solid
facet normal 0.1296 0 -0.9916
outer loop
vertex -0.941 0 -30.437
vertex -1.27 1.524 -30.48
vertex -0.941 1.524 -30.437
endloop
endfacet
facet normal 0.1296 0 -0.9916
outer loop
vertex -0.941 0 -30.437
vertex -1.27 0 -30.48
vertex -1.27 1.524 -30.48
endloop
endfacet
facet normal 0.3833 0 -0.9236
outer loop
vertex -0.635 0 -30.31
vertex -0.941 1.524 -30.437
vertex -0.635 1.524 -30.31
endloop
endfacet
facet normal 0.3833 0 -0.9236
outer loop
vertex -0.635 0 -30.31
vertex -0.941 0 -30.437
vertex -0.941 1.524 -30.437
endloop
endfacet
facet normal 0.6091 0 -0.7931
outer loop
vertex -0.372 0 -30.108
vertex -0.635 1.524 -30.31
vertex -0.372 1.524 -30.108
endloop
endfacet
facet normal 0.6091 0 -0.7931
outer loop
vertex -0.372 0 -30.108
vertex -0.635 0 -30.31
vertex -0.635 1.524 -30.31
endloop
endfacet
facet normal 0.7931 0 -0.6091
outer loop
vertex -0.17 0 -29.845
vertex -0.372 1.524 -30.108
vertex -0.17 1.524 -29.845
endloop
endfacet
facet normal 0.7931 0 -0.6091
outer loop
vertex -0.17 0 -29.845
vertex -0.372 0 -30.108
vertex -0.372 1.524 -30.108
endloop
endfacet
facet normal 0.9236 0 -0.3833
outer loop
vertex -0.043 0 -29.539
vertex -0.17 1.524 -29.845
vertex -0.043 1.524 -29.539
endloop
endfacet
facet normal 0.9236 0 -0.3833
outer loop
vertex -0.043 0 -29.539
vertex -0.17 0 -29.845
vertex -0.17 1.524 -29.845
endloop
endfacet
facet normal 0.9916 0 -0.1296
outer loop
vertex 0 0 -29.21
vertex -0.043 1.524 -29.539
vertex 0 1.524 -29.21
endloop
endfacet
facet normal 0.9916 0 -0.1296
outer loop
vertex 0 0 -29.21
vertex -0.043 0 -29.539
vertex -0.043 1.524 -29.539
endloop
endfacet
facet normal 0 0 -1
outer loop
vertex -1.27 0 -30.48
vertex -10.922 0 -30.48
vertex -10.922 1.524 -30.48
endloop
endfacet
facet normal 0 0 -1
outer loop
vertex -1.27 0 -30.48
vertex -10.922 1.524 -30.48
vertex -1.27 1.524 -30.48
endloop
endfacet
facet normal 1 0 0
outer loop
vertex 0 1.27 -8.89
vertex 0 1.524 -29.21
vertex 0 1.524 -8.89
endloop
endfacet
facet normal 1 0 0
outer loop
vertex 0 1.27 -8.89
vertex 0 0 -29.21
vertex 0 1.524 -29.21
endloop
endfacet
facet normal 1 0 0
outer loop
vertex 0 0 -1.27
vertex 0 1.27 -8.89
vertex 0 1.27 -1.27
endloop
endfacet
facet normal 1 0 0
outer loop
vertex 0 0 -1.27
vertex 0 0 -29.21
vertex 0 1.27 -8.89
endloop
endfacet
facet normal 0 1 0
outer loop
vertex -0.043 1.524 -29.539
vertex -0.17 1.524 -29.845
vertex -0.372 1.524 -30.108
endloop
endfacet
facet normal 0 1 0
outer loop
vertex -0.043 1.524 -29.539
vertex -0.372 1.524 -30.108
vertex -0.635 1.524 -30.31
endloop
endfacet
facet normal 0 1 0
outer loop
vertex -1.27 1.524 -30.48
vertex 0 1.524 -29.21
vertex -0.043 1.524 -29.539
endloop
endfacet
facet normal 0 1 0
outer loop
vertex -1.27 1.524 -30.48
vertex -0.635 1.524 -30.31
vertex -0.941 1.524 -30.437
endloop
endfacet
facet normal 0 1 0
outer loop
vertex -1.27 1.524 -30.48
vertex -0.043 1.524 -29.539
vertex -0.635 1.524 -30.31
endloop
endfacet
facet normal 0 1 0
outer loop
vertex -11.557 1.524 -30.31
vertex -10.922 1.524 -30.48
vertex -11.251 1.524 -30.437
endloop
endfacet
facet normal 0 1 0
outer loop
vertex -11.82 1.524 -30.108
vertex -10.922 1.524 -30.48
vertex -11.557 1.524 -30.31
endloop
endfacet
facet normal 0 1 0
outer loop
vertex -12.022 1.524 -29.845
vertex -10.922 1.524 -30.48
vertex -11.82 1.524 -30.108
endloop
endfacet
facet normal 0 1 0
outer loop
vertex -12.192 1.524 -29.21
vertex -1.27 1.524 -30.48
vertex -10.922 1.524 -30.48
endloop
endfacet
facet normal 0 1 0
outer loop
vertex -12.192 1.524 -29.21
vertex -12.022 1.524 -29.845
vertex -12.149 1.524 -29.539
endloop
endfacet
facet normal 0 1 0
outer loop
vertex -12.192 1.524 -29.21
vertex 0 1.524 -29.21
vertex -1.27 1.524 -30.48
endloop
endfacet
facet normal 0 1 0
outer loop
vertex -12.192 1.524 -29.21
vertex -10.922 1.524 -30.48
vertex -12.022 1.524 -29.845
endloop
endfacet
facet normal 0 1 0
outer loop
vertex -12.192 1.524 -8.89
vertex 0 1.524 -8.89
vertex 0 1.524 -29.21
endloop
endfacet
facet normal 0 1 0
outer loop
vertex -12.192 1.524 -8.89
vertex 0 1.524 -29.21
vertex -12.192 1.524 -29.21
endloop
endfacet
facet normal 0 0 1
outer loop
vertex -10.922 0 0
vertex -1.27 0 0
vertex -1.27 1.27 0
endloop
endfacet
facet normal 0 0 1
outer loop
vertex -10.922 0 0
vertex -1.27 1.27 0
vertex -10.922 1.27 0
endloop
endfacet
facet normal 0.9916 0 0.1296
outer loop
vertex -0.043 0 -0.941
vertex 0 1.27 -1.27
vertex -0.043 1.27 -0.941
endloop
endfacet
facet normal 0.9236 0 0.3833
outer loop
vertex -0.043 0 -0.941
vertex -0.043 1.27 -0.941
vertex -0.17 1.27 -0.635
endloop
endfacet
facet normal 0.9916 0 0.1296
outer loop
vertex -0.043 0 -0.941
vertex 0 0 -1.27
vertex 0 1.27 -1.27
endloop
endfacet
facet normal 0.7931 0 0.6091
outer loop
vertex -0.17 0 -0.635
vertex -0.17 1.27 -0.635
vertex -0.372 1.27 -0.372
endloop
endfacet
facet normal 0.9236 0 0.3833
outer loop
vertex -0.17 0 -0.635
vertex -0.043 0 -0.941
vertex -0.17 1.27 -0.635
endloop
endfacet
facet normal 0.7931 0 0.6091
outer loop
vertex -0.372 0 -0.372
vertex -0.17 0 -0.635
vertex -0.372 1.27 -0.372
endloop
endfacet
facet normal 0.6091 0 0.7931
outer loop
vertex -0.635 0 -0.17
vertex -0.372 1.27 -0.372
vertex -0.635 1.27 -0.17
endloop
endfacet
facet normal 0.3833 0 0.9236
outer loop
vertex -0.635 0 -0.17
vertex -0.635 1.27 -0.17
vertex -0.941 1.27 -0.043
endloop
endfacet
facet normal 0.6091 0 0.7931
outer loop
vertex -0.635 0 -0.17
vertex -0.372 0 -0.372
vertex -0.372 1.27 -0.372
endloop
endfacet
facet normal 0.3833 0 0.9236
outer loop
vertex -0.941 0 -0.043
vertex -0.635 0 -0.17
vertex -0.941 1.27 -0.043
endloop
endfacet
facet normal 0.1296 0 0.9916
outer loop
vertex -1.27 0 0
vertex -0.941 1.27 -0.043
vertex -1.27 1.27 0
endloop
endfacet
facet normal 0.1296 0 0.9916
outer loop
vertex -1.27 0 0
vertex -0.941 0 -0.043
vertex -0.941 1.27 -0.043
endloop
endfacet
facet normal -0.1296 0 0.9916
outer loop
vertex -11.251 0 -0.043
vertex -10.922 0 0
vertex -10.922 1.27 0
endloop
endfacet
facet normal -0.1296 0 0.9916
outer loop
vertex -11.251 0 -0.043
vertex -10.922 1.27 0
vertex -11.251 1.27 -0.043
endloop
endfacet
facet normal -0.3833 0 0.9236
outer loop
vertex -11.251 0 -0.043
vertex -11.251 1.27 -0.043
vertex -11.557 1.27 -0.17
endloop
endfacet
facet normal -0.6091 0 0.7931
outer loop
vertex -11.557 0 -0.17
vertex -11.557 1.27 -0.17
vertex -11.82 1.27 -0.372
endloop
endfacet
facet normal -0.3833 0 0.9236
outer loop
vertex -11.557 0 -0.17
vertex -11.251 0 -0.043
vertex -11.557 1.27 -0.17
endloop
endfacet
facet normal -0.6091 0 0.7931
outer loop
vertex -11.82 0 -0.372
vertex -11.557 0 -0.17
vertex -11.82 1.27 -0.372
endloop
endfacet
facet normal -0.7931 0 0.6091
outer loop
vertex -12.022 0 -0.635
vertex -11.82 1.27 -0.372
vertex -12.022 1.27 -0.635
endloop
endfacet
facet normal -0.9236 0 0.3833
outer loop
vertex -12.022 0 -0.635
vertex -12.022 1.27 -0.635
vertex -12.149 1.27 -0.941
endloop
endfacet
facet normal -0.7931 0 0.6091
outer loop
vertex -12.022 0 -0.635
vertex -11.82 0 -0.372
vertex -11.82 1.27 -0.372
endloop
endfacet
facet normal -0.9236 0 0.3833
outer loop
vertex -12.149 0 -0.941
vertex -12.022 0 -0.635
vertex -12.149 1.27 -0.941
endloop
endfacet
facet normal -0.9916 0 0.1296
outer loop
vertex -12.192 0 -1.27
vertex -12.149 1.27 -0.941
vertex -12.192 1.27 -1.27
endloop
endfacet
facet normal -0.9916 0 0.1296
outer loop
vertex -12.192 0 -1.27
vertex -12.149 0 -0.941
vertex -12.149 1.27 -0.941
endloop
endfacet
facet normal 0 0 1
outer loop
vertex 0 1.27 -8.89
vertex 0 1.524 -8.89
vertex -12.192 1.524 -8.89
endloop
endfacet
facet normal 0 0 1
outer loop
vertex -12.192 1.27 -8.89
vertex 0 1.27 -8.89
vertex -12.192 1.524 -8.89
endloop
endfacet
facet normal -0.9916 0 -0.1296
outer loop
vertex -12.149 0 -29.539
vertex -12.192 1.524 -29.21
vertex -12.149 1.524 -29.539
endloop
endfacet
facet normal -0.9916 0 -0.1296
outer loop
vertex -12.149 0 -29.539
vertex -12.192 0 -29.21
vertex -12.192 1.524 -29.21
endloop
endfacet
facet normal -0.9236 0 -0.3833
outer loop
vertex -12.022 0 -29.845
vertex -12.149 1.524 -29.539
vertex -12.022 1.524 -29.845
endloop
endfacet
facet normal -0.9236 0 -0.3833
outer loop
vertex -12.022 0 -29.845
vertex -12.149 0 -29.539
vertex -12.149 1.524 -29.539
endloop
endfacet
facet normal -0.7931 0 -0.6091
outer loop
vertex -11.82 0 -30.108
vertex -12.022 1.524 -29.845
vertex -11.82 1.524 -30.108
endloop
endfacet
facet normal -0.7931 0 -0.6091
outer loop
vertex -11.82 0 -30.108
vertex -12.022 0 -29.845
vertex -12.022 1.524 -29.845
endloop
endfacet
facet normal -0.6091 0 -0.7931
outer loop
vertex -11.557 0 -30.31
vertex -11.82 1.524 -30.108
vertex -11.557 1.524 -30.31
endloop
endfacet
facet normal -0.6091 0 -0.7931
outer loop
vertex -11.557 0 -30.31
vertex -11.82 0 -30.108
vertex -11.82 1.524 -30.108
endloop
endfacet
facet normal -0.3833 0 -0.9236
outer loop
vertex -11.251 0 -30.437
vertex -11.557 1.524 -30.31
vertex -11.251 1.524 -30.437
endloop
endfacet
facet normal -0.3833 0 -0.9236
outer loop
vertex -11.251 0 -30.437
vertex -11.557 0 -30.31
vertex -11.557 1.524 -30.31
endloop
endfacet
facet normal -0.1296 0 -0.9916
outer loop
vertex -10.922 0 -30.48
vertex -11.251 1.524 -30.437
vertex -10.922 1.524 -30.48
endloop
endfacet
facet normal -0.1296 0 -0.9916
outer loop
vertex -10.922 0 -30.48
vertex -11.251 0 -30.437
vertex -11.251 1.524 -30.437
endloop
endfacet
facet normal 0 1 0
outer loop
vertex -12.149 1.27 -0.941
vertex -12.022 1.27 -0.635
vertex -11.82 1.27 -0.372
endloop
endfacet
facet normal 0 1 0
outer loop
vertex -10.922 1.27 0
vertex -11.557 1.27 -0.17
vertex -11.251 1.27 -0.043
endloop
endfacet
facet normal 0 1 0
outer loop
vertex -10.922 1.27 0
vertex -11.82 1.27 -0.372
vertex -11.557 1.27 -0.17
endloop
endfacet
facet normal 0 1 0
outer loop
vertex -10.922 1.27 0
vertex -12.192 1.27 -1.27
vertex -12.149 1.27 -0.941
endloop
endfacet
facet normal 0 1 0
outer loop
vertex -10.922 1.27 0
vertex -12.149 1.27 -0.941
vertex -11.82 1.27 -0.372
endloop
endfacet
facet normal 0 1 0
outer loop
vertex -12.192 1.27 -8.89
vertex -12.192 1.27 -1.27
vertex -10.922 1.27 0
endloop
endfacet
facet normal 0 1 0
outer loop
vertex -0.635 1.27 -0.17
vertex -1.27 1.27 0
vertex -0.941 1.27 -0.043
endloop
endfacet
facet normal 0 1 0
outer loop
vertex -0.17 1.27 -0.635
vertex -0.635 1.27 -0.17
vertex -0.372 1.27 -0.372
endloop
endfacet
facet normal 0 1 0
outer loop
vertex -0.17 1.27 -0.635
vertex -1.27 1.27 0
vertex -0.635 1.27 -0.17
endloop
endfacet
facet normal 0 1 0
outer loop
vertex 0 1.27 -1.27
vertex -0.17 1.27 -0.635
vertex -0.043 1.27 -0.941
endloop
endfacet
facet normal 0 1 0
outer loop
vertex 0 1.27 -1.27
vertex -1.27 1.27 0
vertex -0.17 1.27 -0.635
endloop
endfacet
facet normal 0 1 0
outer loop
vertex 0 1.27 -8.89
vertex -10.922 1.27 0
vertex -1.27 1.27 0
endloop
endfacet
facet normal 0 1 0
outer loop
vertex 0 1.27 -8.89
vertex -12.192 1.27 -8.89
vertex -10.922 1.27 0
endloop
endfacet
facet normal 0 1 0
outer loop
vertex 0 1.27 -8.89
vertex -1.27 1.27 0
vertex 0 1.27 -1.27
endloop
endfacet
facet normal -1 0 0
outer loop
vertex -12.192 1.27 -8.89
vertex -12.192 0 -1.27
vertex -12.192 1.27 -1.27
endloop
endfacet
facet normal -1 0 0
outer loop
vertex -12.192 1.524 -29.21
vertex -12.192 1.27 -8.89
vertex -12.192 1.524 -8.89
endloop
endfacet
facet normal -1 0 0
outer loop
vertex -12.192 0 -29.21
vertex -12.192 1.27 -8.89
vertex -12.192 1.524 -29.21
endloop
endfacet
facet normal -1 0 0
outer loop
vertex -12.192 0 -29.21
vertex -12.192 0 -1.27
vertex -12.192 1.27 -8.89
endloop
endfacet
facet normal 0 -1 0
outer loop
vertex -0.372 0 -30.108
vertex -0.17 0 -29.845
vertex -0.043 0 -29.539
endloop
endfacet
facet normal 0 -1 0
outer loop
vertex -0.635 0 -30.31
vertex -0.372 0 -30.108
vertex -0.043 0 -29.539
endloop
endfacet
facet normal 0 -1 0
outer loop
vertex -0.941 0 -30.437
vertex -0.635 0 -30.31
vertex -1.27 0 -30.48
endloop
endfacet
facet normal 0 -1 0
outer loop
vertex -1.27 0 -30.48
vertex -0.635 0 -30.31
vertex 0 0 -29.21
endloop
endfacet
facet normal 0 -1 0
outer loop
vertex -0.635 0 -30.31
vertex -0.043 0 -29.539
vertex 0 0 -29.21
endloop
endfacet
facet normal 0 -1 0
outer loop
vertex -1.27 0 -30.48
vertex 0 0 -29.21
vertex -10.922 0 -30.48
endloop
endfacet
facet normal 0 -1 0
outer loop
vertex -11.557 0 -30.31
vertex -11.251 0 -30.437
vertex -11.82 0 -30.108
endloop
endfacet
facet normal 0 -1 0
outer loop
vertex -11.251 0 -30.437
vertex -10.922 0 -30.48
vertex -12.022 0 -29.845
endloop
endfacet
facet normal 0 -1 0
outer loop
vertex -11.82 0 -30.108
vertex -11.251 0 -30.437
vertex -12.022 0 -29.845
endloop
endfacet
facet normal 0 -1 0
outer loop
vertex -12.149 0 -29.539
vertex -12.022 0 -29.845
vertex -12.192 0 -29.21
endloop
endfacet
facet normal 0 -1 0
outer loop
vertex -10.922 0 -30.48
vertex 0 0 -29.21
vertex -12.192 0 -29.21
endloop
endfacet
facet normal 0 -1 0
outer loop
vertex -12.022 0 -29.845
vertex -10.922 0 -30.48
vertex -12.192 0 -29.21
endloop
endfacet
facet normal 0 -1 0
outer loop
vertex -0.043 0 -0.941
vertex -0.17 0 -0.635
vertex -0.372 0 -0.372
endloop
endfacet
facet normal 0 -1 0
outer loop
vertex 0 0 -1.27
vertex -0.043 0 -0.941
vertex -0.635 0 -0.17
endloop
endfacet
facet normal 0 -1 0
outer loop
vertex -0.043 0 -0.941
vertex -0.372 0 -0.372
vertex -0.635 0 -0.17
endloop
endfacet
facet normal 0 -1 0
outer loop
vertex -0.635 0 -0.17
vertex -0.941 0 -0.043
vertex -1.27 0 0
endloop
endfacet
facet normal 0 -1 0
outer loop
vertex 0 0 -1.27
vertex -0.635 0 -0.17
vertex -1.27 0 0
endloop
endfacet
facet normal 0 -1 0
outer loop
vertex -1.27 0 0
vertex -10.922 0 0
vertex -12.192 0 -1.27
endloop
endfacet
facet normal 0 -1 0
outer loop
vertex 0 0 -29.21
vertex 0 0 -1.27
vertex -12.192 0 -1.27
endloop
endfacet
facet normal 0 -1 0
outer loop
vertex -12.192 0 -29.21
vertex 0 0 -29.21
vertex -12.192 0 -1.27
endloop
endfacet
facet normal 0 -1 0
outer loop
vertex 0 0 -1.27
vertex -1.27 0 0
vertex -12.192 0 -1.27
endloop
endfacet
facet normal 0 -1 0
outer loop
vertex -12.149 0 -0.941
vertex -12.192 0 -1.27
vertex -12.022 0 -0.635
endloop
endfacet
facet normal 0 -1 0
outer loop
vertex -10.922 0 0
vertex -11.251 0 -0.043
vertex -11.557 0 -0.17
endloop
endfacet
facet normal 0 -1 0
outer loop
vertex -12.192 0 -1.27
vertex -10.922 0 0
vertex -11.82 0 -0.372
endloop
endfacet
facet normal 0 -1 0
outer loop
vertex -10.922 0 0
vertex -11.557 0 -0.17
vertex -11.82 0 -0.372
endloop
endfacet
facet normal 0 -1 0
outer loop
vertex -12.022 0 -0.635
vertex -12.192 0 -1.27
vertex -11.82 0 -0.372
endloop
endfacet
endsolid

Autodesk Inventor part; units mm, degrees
ref_plane "YZ Plane" through (0, 0, 0) normal (1, 0, 0) x (0, 1, 0)
ref_plane "XZ Plane" through (0, 0, 0) normal (0, 1, 0) x (-1, 0, 0)
ref_plane "XY Plane" through (0, 0, 0) normal (0, 0, 1) x (1, 0, 0)
sketch "Sketch1" plane through (0, 0, 0) normal (0, 1, 0) x (-1, 0, 0)
  line L0 (1.27, 0) -> (10.922, 0)
  line L1 (12.192, -1.27) -> (12.192, -29.21)
  line L2 (10.922, -30.48) -> (1.27, -30.48)
  line L3 (0, -29.21) -> (0, -1.27)
  arc A0 (12.192, -1.27) -> (10.922, 0) centre (10.922, -1.27) ccw
  arc A1 (1.27, 0) -> (0, -1.27) centre (1.27, -1.27) ccw
  arc A2 (0, -29.21) -> (1.27, -30.48) centre (1.27, -29.21) ccw
  arc A3 (10.922, -30.48) -> (12.192, -29.21) centre (10.922, -29.21) ccw
  point P0 (0, 0)
  point P1 (12.192, -30.48)
  point P2 (12.192, 0)
  point P3 (0, -30.48)
  dimension "d0" = 12.192
  dimension "d1" = 30.48
  dimension "d2" = 1.27
extrude "Extrusion1" add sketch "Sketch1" along normal blind 1.524
sketch "Sketch2" plane through (0, 1.524, 0) normal (0, 1, 0) x (1, 0, 0)
  line L0 (0, 1.27) -> (0, 29.21) projected
  line L1 (-12.192, 0) -> (0, 0)
  line L2 (0, 0) -> (0, 8.89)
  line L3 (0, 8.89) -> (-12.192, 8.89)
  line L4 (-12.192, 8.89) -> (-12.192, 0)
  arc A0 (-12.192, 1.27) -> (-10.922, 0) centre (-10.922, 1.27) ccw projected
  line L5 (-10.922, 0) -> (-1.27, 0) construction
  point P0 (0, 0)
  dimension "d5" = 8.89
  dimension "d6" = 12.192
  dimension "d7" = 9.652
extrude "Extrusion2" cut sketch "Sketch2" against normal blind 0.254
properties part number "Adafruit-MicroLipoBatteryCharger"
